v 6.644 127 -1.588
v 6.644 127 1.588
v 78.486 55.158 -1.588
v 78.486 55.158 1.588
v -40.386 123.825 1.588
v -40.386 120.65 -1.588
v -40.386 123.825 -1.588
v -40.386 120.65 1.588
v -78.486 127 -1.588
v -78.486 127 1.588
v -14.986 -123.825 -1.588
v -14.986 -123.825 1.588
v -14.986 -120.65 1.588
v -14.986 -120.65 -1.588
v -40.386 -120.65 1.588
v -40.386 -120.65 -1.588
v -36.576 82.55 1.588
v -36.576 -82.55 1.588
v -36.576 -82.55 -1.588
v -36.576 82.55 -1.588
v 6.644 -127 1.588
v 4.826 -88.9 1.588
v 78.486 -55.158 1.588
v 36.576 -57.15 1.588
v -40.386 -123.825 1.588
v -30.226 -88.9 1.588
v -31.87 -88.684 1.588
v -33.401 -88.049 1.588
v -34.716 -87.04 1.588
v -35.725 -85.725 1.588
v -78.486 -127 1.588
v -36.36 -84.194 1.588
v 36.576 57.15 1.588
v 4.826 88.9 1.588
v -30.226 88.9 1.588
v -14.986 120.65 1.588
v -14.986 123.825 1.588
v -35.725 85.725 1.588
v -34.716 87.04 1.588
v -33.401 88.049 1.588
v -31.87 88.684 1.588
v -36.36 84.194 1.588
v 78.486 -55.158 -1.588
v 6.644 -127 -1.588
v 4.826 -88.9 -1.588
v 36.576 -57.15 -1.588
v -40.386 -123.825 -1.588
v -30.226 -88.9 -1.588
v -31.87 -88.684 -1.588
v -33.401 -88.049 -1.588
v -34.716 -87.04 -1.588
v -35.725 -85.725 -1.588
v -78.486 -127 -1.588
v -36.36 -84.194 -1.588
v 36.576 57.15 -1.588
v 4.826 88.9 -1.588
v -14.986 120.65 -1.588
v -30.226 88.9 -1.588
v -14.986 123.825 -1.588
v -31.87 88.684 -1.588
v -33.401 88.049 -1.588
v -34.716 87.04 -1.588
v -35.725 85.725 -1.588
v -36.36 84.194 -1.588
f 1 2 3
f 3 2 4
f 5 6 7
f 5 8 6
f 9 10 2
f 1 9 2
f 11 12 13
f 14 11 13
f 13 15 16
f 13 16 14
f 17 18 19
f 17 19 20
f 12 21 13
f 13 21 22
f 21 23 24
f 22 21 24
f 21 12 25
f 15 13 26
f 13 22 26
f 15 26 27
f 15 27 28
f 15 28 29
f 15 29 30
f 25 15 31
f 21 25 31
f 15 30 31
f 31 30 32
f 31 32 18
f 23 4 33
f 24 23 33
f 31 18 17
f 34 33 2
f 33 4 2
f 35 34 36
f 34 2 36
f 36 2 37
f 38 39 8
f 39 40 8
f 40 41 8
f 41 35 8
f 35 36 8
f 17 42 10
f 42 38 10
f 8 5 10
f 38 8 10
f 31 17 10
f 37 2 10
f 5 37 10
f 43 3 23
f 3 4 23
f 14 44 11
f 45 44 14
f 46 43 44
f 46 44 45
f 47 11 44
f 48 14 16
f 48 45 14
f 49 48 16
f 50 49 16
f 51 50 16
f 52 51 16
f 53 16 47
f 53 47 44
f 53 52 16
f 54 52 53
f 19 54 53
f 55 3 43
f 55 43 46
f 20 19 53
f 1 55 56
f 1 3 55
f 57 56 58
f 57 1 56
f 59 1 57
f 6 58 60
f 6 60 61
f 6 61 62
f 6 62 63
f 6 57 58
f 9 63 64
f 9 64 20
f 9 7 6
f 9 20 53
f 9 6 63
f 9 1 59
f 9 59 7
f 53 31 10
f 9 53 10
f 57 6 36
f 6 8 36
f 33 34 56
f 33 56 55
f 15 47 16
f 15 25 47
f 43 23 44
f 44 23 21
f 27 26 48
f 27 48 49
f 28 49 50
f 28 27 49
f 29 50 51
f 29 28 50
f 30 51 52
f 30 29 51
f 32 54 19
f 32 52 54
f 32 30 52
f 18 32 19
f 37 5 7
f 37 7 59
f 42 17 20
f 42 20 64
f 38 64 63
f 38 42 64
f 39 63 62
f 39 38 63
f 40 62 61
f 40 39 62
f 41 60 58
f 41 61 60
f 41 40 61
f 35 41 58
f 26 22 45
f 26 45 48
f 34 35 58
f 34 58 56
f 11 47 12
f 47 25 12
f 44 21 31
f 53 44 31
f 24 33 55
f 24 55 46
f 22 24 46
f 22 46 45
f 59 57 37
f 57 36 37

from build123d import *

# Parameters (mm, degrees)
SKETCH1_W         = 25.4
SKETCH1_H         = 3.175
PLATE_DEPTH       = 1.5875
CENTER_HOLE_DEPTH = 150.328941672


with BuildPart() as part:
    # Sketch1 → Plate (new, symmetric)
    with BuildSketch(Plane.XY):
        Polygon((-78.486, 127), (6.643951031, 127), (78.486, 55.157951031), (78.486, -55.157951031), (6.643951031, -127), (-78.486, -127), align=None)
        with Locations((-27.686, 122.2375)):
            Rectangle(SKETCH1_W, SKETCH1_H, mode=Mode.SUBTRACT)
        with Locations((-27.686, -122.2375)):
            Rectangle(SKETCH1_W, SKETCH1_H, mode=Mode.SUBTRACT)
    extrude(amount=PLATE_DEPTH, both=True)

    # Sketch4 → Center Hole (cut, through all)
    with BuildSketch(Plane.XY.offset(1.5875)):
        with BuildLine():
            Line((4.826, 88.9), (36.576, 57.15))
            Line((36.576, 57.15), (36.576, -57.15))
            Line((36.576, -57.15), (4.826, -88.9))
            Line((4.826, -88.9), (-30.226, -88.9))
            ThreePointArc((-30.226, -88.9), (-34.716128061, -87.040128061), (-36.576, -82.55))
            Line((-36.576, -82.55), (-36.576, 82.55))
            ThreePointArc((-36.576, 82.55), (-34.716128061, 87.040128061), (-30.226, 88.9))
            Line((-30.226, 88.9), (4.826, 88.9))
        make_face()
    extrude(amount=-CENTER_HOLE_DEPTH, mode=Mode.SUBTRACT)


solid = part.part
